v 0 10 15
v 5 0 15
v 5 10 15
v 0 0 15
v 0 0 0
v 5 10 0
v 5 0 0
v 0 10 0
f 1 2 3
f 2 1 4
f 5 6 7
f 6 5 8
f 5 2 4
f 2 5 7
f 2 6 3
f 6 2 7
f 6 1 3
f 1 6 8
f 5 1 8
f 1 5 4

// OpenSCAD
// A cube, the 3-part array defines the length of the sides in x, y and z
// By default, the cube is position with its corner at the origin, extending along x+, y+ and z+

cube([5, 10, 15]);


// A centred cube, using the optional center=true parameter
// Disabled initially using the "*" modifier - just delete the "*" character to see the result
*cube([5, 10, 15], center=true);


// A sphere, of radius 25
// Spheres are always centred on the origin
*sphere(25);


// A cylinder, of radius = 5mm and height = 10mm
// By default, cylinders are centred on the origin, but "sit" on the XY plane
*cylinder(r=5, h=10);


// A fully centred cylinder, using the optional center=true parameter
*cylinder(r=5, h=10, center=true);


// Cylinders can also be tapered, by defining two radius values
// r1 is the radius at the base, r2 is the radius at the top
*cylinder(r1=10, r2=5, h=20);
